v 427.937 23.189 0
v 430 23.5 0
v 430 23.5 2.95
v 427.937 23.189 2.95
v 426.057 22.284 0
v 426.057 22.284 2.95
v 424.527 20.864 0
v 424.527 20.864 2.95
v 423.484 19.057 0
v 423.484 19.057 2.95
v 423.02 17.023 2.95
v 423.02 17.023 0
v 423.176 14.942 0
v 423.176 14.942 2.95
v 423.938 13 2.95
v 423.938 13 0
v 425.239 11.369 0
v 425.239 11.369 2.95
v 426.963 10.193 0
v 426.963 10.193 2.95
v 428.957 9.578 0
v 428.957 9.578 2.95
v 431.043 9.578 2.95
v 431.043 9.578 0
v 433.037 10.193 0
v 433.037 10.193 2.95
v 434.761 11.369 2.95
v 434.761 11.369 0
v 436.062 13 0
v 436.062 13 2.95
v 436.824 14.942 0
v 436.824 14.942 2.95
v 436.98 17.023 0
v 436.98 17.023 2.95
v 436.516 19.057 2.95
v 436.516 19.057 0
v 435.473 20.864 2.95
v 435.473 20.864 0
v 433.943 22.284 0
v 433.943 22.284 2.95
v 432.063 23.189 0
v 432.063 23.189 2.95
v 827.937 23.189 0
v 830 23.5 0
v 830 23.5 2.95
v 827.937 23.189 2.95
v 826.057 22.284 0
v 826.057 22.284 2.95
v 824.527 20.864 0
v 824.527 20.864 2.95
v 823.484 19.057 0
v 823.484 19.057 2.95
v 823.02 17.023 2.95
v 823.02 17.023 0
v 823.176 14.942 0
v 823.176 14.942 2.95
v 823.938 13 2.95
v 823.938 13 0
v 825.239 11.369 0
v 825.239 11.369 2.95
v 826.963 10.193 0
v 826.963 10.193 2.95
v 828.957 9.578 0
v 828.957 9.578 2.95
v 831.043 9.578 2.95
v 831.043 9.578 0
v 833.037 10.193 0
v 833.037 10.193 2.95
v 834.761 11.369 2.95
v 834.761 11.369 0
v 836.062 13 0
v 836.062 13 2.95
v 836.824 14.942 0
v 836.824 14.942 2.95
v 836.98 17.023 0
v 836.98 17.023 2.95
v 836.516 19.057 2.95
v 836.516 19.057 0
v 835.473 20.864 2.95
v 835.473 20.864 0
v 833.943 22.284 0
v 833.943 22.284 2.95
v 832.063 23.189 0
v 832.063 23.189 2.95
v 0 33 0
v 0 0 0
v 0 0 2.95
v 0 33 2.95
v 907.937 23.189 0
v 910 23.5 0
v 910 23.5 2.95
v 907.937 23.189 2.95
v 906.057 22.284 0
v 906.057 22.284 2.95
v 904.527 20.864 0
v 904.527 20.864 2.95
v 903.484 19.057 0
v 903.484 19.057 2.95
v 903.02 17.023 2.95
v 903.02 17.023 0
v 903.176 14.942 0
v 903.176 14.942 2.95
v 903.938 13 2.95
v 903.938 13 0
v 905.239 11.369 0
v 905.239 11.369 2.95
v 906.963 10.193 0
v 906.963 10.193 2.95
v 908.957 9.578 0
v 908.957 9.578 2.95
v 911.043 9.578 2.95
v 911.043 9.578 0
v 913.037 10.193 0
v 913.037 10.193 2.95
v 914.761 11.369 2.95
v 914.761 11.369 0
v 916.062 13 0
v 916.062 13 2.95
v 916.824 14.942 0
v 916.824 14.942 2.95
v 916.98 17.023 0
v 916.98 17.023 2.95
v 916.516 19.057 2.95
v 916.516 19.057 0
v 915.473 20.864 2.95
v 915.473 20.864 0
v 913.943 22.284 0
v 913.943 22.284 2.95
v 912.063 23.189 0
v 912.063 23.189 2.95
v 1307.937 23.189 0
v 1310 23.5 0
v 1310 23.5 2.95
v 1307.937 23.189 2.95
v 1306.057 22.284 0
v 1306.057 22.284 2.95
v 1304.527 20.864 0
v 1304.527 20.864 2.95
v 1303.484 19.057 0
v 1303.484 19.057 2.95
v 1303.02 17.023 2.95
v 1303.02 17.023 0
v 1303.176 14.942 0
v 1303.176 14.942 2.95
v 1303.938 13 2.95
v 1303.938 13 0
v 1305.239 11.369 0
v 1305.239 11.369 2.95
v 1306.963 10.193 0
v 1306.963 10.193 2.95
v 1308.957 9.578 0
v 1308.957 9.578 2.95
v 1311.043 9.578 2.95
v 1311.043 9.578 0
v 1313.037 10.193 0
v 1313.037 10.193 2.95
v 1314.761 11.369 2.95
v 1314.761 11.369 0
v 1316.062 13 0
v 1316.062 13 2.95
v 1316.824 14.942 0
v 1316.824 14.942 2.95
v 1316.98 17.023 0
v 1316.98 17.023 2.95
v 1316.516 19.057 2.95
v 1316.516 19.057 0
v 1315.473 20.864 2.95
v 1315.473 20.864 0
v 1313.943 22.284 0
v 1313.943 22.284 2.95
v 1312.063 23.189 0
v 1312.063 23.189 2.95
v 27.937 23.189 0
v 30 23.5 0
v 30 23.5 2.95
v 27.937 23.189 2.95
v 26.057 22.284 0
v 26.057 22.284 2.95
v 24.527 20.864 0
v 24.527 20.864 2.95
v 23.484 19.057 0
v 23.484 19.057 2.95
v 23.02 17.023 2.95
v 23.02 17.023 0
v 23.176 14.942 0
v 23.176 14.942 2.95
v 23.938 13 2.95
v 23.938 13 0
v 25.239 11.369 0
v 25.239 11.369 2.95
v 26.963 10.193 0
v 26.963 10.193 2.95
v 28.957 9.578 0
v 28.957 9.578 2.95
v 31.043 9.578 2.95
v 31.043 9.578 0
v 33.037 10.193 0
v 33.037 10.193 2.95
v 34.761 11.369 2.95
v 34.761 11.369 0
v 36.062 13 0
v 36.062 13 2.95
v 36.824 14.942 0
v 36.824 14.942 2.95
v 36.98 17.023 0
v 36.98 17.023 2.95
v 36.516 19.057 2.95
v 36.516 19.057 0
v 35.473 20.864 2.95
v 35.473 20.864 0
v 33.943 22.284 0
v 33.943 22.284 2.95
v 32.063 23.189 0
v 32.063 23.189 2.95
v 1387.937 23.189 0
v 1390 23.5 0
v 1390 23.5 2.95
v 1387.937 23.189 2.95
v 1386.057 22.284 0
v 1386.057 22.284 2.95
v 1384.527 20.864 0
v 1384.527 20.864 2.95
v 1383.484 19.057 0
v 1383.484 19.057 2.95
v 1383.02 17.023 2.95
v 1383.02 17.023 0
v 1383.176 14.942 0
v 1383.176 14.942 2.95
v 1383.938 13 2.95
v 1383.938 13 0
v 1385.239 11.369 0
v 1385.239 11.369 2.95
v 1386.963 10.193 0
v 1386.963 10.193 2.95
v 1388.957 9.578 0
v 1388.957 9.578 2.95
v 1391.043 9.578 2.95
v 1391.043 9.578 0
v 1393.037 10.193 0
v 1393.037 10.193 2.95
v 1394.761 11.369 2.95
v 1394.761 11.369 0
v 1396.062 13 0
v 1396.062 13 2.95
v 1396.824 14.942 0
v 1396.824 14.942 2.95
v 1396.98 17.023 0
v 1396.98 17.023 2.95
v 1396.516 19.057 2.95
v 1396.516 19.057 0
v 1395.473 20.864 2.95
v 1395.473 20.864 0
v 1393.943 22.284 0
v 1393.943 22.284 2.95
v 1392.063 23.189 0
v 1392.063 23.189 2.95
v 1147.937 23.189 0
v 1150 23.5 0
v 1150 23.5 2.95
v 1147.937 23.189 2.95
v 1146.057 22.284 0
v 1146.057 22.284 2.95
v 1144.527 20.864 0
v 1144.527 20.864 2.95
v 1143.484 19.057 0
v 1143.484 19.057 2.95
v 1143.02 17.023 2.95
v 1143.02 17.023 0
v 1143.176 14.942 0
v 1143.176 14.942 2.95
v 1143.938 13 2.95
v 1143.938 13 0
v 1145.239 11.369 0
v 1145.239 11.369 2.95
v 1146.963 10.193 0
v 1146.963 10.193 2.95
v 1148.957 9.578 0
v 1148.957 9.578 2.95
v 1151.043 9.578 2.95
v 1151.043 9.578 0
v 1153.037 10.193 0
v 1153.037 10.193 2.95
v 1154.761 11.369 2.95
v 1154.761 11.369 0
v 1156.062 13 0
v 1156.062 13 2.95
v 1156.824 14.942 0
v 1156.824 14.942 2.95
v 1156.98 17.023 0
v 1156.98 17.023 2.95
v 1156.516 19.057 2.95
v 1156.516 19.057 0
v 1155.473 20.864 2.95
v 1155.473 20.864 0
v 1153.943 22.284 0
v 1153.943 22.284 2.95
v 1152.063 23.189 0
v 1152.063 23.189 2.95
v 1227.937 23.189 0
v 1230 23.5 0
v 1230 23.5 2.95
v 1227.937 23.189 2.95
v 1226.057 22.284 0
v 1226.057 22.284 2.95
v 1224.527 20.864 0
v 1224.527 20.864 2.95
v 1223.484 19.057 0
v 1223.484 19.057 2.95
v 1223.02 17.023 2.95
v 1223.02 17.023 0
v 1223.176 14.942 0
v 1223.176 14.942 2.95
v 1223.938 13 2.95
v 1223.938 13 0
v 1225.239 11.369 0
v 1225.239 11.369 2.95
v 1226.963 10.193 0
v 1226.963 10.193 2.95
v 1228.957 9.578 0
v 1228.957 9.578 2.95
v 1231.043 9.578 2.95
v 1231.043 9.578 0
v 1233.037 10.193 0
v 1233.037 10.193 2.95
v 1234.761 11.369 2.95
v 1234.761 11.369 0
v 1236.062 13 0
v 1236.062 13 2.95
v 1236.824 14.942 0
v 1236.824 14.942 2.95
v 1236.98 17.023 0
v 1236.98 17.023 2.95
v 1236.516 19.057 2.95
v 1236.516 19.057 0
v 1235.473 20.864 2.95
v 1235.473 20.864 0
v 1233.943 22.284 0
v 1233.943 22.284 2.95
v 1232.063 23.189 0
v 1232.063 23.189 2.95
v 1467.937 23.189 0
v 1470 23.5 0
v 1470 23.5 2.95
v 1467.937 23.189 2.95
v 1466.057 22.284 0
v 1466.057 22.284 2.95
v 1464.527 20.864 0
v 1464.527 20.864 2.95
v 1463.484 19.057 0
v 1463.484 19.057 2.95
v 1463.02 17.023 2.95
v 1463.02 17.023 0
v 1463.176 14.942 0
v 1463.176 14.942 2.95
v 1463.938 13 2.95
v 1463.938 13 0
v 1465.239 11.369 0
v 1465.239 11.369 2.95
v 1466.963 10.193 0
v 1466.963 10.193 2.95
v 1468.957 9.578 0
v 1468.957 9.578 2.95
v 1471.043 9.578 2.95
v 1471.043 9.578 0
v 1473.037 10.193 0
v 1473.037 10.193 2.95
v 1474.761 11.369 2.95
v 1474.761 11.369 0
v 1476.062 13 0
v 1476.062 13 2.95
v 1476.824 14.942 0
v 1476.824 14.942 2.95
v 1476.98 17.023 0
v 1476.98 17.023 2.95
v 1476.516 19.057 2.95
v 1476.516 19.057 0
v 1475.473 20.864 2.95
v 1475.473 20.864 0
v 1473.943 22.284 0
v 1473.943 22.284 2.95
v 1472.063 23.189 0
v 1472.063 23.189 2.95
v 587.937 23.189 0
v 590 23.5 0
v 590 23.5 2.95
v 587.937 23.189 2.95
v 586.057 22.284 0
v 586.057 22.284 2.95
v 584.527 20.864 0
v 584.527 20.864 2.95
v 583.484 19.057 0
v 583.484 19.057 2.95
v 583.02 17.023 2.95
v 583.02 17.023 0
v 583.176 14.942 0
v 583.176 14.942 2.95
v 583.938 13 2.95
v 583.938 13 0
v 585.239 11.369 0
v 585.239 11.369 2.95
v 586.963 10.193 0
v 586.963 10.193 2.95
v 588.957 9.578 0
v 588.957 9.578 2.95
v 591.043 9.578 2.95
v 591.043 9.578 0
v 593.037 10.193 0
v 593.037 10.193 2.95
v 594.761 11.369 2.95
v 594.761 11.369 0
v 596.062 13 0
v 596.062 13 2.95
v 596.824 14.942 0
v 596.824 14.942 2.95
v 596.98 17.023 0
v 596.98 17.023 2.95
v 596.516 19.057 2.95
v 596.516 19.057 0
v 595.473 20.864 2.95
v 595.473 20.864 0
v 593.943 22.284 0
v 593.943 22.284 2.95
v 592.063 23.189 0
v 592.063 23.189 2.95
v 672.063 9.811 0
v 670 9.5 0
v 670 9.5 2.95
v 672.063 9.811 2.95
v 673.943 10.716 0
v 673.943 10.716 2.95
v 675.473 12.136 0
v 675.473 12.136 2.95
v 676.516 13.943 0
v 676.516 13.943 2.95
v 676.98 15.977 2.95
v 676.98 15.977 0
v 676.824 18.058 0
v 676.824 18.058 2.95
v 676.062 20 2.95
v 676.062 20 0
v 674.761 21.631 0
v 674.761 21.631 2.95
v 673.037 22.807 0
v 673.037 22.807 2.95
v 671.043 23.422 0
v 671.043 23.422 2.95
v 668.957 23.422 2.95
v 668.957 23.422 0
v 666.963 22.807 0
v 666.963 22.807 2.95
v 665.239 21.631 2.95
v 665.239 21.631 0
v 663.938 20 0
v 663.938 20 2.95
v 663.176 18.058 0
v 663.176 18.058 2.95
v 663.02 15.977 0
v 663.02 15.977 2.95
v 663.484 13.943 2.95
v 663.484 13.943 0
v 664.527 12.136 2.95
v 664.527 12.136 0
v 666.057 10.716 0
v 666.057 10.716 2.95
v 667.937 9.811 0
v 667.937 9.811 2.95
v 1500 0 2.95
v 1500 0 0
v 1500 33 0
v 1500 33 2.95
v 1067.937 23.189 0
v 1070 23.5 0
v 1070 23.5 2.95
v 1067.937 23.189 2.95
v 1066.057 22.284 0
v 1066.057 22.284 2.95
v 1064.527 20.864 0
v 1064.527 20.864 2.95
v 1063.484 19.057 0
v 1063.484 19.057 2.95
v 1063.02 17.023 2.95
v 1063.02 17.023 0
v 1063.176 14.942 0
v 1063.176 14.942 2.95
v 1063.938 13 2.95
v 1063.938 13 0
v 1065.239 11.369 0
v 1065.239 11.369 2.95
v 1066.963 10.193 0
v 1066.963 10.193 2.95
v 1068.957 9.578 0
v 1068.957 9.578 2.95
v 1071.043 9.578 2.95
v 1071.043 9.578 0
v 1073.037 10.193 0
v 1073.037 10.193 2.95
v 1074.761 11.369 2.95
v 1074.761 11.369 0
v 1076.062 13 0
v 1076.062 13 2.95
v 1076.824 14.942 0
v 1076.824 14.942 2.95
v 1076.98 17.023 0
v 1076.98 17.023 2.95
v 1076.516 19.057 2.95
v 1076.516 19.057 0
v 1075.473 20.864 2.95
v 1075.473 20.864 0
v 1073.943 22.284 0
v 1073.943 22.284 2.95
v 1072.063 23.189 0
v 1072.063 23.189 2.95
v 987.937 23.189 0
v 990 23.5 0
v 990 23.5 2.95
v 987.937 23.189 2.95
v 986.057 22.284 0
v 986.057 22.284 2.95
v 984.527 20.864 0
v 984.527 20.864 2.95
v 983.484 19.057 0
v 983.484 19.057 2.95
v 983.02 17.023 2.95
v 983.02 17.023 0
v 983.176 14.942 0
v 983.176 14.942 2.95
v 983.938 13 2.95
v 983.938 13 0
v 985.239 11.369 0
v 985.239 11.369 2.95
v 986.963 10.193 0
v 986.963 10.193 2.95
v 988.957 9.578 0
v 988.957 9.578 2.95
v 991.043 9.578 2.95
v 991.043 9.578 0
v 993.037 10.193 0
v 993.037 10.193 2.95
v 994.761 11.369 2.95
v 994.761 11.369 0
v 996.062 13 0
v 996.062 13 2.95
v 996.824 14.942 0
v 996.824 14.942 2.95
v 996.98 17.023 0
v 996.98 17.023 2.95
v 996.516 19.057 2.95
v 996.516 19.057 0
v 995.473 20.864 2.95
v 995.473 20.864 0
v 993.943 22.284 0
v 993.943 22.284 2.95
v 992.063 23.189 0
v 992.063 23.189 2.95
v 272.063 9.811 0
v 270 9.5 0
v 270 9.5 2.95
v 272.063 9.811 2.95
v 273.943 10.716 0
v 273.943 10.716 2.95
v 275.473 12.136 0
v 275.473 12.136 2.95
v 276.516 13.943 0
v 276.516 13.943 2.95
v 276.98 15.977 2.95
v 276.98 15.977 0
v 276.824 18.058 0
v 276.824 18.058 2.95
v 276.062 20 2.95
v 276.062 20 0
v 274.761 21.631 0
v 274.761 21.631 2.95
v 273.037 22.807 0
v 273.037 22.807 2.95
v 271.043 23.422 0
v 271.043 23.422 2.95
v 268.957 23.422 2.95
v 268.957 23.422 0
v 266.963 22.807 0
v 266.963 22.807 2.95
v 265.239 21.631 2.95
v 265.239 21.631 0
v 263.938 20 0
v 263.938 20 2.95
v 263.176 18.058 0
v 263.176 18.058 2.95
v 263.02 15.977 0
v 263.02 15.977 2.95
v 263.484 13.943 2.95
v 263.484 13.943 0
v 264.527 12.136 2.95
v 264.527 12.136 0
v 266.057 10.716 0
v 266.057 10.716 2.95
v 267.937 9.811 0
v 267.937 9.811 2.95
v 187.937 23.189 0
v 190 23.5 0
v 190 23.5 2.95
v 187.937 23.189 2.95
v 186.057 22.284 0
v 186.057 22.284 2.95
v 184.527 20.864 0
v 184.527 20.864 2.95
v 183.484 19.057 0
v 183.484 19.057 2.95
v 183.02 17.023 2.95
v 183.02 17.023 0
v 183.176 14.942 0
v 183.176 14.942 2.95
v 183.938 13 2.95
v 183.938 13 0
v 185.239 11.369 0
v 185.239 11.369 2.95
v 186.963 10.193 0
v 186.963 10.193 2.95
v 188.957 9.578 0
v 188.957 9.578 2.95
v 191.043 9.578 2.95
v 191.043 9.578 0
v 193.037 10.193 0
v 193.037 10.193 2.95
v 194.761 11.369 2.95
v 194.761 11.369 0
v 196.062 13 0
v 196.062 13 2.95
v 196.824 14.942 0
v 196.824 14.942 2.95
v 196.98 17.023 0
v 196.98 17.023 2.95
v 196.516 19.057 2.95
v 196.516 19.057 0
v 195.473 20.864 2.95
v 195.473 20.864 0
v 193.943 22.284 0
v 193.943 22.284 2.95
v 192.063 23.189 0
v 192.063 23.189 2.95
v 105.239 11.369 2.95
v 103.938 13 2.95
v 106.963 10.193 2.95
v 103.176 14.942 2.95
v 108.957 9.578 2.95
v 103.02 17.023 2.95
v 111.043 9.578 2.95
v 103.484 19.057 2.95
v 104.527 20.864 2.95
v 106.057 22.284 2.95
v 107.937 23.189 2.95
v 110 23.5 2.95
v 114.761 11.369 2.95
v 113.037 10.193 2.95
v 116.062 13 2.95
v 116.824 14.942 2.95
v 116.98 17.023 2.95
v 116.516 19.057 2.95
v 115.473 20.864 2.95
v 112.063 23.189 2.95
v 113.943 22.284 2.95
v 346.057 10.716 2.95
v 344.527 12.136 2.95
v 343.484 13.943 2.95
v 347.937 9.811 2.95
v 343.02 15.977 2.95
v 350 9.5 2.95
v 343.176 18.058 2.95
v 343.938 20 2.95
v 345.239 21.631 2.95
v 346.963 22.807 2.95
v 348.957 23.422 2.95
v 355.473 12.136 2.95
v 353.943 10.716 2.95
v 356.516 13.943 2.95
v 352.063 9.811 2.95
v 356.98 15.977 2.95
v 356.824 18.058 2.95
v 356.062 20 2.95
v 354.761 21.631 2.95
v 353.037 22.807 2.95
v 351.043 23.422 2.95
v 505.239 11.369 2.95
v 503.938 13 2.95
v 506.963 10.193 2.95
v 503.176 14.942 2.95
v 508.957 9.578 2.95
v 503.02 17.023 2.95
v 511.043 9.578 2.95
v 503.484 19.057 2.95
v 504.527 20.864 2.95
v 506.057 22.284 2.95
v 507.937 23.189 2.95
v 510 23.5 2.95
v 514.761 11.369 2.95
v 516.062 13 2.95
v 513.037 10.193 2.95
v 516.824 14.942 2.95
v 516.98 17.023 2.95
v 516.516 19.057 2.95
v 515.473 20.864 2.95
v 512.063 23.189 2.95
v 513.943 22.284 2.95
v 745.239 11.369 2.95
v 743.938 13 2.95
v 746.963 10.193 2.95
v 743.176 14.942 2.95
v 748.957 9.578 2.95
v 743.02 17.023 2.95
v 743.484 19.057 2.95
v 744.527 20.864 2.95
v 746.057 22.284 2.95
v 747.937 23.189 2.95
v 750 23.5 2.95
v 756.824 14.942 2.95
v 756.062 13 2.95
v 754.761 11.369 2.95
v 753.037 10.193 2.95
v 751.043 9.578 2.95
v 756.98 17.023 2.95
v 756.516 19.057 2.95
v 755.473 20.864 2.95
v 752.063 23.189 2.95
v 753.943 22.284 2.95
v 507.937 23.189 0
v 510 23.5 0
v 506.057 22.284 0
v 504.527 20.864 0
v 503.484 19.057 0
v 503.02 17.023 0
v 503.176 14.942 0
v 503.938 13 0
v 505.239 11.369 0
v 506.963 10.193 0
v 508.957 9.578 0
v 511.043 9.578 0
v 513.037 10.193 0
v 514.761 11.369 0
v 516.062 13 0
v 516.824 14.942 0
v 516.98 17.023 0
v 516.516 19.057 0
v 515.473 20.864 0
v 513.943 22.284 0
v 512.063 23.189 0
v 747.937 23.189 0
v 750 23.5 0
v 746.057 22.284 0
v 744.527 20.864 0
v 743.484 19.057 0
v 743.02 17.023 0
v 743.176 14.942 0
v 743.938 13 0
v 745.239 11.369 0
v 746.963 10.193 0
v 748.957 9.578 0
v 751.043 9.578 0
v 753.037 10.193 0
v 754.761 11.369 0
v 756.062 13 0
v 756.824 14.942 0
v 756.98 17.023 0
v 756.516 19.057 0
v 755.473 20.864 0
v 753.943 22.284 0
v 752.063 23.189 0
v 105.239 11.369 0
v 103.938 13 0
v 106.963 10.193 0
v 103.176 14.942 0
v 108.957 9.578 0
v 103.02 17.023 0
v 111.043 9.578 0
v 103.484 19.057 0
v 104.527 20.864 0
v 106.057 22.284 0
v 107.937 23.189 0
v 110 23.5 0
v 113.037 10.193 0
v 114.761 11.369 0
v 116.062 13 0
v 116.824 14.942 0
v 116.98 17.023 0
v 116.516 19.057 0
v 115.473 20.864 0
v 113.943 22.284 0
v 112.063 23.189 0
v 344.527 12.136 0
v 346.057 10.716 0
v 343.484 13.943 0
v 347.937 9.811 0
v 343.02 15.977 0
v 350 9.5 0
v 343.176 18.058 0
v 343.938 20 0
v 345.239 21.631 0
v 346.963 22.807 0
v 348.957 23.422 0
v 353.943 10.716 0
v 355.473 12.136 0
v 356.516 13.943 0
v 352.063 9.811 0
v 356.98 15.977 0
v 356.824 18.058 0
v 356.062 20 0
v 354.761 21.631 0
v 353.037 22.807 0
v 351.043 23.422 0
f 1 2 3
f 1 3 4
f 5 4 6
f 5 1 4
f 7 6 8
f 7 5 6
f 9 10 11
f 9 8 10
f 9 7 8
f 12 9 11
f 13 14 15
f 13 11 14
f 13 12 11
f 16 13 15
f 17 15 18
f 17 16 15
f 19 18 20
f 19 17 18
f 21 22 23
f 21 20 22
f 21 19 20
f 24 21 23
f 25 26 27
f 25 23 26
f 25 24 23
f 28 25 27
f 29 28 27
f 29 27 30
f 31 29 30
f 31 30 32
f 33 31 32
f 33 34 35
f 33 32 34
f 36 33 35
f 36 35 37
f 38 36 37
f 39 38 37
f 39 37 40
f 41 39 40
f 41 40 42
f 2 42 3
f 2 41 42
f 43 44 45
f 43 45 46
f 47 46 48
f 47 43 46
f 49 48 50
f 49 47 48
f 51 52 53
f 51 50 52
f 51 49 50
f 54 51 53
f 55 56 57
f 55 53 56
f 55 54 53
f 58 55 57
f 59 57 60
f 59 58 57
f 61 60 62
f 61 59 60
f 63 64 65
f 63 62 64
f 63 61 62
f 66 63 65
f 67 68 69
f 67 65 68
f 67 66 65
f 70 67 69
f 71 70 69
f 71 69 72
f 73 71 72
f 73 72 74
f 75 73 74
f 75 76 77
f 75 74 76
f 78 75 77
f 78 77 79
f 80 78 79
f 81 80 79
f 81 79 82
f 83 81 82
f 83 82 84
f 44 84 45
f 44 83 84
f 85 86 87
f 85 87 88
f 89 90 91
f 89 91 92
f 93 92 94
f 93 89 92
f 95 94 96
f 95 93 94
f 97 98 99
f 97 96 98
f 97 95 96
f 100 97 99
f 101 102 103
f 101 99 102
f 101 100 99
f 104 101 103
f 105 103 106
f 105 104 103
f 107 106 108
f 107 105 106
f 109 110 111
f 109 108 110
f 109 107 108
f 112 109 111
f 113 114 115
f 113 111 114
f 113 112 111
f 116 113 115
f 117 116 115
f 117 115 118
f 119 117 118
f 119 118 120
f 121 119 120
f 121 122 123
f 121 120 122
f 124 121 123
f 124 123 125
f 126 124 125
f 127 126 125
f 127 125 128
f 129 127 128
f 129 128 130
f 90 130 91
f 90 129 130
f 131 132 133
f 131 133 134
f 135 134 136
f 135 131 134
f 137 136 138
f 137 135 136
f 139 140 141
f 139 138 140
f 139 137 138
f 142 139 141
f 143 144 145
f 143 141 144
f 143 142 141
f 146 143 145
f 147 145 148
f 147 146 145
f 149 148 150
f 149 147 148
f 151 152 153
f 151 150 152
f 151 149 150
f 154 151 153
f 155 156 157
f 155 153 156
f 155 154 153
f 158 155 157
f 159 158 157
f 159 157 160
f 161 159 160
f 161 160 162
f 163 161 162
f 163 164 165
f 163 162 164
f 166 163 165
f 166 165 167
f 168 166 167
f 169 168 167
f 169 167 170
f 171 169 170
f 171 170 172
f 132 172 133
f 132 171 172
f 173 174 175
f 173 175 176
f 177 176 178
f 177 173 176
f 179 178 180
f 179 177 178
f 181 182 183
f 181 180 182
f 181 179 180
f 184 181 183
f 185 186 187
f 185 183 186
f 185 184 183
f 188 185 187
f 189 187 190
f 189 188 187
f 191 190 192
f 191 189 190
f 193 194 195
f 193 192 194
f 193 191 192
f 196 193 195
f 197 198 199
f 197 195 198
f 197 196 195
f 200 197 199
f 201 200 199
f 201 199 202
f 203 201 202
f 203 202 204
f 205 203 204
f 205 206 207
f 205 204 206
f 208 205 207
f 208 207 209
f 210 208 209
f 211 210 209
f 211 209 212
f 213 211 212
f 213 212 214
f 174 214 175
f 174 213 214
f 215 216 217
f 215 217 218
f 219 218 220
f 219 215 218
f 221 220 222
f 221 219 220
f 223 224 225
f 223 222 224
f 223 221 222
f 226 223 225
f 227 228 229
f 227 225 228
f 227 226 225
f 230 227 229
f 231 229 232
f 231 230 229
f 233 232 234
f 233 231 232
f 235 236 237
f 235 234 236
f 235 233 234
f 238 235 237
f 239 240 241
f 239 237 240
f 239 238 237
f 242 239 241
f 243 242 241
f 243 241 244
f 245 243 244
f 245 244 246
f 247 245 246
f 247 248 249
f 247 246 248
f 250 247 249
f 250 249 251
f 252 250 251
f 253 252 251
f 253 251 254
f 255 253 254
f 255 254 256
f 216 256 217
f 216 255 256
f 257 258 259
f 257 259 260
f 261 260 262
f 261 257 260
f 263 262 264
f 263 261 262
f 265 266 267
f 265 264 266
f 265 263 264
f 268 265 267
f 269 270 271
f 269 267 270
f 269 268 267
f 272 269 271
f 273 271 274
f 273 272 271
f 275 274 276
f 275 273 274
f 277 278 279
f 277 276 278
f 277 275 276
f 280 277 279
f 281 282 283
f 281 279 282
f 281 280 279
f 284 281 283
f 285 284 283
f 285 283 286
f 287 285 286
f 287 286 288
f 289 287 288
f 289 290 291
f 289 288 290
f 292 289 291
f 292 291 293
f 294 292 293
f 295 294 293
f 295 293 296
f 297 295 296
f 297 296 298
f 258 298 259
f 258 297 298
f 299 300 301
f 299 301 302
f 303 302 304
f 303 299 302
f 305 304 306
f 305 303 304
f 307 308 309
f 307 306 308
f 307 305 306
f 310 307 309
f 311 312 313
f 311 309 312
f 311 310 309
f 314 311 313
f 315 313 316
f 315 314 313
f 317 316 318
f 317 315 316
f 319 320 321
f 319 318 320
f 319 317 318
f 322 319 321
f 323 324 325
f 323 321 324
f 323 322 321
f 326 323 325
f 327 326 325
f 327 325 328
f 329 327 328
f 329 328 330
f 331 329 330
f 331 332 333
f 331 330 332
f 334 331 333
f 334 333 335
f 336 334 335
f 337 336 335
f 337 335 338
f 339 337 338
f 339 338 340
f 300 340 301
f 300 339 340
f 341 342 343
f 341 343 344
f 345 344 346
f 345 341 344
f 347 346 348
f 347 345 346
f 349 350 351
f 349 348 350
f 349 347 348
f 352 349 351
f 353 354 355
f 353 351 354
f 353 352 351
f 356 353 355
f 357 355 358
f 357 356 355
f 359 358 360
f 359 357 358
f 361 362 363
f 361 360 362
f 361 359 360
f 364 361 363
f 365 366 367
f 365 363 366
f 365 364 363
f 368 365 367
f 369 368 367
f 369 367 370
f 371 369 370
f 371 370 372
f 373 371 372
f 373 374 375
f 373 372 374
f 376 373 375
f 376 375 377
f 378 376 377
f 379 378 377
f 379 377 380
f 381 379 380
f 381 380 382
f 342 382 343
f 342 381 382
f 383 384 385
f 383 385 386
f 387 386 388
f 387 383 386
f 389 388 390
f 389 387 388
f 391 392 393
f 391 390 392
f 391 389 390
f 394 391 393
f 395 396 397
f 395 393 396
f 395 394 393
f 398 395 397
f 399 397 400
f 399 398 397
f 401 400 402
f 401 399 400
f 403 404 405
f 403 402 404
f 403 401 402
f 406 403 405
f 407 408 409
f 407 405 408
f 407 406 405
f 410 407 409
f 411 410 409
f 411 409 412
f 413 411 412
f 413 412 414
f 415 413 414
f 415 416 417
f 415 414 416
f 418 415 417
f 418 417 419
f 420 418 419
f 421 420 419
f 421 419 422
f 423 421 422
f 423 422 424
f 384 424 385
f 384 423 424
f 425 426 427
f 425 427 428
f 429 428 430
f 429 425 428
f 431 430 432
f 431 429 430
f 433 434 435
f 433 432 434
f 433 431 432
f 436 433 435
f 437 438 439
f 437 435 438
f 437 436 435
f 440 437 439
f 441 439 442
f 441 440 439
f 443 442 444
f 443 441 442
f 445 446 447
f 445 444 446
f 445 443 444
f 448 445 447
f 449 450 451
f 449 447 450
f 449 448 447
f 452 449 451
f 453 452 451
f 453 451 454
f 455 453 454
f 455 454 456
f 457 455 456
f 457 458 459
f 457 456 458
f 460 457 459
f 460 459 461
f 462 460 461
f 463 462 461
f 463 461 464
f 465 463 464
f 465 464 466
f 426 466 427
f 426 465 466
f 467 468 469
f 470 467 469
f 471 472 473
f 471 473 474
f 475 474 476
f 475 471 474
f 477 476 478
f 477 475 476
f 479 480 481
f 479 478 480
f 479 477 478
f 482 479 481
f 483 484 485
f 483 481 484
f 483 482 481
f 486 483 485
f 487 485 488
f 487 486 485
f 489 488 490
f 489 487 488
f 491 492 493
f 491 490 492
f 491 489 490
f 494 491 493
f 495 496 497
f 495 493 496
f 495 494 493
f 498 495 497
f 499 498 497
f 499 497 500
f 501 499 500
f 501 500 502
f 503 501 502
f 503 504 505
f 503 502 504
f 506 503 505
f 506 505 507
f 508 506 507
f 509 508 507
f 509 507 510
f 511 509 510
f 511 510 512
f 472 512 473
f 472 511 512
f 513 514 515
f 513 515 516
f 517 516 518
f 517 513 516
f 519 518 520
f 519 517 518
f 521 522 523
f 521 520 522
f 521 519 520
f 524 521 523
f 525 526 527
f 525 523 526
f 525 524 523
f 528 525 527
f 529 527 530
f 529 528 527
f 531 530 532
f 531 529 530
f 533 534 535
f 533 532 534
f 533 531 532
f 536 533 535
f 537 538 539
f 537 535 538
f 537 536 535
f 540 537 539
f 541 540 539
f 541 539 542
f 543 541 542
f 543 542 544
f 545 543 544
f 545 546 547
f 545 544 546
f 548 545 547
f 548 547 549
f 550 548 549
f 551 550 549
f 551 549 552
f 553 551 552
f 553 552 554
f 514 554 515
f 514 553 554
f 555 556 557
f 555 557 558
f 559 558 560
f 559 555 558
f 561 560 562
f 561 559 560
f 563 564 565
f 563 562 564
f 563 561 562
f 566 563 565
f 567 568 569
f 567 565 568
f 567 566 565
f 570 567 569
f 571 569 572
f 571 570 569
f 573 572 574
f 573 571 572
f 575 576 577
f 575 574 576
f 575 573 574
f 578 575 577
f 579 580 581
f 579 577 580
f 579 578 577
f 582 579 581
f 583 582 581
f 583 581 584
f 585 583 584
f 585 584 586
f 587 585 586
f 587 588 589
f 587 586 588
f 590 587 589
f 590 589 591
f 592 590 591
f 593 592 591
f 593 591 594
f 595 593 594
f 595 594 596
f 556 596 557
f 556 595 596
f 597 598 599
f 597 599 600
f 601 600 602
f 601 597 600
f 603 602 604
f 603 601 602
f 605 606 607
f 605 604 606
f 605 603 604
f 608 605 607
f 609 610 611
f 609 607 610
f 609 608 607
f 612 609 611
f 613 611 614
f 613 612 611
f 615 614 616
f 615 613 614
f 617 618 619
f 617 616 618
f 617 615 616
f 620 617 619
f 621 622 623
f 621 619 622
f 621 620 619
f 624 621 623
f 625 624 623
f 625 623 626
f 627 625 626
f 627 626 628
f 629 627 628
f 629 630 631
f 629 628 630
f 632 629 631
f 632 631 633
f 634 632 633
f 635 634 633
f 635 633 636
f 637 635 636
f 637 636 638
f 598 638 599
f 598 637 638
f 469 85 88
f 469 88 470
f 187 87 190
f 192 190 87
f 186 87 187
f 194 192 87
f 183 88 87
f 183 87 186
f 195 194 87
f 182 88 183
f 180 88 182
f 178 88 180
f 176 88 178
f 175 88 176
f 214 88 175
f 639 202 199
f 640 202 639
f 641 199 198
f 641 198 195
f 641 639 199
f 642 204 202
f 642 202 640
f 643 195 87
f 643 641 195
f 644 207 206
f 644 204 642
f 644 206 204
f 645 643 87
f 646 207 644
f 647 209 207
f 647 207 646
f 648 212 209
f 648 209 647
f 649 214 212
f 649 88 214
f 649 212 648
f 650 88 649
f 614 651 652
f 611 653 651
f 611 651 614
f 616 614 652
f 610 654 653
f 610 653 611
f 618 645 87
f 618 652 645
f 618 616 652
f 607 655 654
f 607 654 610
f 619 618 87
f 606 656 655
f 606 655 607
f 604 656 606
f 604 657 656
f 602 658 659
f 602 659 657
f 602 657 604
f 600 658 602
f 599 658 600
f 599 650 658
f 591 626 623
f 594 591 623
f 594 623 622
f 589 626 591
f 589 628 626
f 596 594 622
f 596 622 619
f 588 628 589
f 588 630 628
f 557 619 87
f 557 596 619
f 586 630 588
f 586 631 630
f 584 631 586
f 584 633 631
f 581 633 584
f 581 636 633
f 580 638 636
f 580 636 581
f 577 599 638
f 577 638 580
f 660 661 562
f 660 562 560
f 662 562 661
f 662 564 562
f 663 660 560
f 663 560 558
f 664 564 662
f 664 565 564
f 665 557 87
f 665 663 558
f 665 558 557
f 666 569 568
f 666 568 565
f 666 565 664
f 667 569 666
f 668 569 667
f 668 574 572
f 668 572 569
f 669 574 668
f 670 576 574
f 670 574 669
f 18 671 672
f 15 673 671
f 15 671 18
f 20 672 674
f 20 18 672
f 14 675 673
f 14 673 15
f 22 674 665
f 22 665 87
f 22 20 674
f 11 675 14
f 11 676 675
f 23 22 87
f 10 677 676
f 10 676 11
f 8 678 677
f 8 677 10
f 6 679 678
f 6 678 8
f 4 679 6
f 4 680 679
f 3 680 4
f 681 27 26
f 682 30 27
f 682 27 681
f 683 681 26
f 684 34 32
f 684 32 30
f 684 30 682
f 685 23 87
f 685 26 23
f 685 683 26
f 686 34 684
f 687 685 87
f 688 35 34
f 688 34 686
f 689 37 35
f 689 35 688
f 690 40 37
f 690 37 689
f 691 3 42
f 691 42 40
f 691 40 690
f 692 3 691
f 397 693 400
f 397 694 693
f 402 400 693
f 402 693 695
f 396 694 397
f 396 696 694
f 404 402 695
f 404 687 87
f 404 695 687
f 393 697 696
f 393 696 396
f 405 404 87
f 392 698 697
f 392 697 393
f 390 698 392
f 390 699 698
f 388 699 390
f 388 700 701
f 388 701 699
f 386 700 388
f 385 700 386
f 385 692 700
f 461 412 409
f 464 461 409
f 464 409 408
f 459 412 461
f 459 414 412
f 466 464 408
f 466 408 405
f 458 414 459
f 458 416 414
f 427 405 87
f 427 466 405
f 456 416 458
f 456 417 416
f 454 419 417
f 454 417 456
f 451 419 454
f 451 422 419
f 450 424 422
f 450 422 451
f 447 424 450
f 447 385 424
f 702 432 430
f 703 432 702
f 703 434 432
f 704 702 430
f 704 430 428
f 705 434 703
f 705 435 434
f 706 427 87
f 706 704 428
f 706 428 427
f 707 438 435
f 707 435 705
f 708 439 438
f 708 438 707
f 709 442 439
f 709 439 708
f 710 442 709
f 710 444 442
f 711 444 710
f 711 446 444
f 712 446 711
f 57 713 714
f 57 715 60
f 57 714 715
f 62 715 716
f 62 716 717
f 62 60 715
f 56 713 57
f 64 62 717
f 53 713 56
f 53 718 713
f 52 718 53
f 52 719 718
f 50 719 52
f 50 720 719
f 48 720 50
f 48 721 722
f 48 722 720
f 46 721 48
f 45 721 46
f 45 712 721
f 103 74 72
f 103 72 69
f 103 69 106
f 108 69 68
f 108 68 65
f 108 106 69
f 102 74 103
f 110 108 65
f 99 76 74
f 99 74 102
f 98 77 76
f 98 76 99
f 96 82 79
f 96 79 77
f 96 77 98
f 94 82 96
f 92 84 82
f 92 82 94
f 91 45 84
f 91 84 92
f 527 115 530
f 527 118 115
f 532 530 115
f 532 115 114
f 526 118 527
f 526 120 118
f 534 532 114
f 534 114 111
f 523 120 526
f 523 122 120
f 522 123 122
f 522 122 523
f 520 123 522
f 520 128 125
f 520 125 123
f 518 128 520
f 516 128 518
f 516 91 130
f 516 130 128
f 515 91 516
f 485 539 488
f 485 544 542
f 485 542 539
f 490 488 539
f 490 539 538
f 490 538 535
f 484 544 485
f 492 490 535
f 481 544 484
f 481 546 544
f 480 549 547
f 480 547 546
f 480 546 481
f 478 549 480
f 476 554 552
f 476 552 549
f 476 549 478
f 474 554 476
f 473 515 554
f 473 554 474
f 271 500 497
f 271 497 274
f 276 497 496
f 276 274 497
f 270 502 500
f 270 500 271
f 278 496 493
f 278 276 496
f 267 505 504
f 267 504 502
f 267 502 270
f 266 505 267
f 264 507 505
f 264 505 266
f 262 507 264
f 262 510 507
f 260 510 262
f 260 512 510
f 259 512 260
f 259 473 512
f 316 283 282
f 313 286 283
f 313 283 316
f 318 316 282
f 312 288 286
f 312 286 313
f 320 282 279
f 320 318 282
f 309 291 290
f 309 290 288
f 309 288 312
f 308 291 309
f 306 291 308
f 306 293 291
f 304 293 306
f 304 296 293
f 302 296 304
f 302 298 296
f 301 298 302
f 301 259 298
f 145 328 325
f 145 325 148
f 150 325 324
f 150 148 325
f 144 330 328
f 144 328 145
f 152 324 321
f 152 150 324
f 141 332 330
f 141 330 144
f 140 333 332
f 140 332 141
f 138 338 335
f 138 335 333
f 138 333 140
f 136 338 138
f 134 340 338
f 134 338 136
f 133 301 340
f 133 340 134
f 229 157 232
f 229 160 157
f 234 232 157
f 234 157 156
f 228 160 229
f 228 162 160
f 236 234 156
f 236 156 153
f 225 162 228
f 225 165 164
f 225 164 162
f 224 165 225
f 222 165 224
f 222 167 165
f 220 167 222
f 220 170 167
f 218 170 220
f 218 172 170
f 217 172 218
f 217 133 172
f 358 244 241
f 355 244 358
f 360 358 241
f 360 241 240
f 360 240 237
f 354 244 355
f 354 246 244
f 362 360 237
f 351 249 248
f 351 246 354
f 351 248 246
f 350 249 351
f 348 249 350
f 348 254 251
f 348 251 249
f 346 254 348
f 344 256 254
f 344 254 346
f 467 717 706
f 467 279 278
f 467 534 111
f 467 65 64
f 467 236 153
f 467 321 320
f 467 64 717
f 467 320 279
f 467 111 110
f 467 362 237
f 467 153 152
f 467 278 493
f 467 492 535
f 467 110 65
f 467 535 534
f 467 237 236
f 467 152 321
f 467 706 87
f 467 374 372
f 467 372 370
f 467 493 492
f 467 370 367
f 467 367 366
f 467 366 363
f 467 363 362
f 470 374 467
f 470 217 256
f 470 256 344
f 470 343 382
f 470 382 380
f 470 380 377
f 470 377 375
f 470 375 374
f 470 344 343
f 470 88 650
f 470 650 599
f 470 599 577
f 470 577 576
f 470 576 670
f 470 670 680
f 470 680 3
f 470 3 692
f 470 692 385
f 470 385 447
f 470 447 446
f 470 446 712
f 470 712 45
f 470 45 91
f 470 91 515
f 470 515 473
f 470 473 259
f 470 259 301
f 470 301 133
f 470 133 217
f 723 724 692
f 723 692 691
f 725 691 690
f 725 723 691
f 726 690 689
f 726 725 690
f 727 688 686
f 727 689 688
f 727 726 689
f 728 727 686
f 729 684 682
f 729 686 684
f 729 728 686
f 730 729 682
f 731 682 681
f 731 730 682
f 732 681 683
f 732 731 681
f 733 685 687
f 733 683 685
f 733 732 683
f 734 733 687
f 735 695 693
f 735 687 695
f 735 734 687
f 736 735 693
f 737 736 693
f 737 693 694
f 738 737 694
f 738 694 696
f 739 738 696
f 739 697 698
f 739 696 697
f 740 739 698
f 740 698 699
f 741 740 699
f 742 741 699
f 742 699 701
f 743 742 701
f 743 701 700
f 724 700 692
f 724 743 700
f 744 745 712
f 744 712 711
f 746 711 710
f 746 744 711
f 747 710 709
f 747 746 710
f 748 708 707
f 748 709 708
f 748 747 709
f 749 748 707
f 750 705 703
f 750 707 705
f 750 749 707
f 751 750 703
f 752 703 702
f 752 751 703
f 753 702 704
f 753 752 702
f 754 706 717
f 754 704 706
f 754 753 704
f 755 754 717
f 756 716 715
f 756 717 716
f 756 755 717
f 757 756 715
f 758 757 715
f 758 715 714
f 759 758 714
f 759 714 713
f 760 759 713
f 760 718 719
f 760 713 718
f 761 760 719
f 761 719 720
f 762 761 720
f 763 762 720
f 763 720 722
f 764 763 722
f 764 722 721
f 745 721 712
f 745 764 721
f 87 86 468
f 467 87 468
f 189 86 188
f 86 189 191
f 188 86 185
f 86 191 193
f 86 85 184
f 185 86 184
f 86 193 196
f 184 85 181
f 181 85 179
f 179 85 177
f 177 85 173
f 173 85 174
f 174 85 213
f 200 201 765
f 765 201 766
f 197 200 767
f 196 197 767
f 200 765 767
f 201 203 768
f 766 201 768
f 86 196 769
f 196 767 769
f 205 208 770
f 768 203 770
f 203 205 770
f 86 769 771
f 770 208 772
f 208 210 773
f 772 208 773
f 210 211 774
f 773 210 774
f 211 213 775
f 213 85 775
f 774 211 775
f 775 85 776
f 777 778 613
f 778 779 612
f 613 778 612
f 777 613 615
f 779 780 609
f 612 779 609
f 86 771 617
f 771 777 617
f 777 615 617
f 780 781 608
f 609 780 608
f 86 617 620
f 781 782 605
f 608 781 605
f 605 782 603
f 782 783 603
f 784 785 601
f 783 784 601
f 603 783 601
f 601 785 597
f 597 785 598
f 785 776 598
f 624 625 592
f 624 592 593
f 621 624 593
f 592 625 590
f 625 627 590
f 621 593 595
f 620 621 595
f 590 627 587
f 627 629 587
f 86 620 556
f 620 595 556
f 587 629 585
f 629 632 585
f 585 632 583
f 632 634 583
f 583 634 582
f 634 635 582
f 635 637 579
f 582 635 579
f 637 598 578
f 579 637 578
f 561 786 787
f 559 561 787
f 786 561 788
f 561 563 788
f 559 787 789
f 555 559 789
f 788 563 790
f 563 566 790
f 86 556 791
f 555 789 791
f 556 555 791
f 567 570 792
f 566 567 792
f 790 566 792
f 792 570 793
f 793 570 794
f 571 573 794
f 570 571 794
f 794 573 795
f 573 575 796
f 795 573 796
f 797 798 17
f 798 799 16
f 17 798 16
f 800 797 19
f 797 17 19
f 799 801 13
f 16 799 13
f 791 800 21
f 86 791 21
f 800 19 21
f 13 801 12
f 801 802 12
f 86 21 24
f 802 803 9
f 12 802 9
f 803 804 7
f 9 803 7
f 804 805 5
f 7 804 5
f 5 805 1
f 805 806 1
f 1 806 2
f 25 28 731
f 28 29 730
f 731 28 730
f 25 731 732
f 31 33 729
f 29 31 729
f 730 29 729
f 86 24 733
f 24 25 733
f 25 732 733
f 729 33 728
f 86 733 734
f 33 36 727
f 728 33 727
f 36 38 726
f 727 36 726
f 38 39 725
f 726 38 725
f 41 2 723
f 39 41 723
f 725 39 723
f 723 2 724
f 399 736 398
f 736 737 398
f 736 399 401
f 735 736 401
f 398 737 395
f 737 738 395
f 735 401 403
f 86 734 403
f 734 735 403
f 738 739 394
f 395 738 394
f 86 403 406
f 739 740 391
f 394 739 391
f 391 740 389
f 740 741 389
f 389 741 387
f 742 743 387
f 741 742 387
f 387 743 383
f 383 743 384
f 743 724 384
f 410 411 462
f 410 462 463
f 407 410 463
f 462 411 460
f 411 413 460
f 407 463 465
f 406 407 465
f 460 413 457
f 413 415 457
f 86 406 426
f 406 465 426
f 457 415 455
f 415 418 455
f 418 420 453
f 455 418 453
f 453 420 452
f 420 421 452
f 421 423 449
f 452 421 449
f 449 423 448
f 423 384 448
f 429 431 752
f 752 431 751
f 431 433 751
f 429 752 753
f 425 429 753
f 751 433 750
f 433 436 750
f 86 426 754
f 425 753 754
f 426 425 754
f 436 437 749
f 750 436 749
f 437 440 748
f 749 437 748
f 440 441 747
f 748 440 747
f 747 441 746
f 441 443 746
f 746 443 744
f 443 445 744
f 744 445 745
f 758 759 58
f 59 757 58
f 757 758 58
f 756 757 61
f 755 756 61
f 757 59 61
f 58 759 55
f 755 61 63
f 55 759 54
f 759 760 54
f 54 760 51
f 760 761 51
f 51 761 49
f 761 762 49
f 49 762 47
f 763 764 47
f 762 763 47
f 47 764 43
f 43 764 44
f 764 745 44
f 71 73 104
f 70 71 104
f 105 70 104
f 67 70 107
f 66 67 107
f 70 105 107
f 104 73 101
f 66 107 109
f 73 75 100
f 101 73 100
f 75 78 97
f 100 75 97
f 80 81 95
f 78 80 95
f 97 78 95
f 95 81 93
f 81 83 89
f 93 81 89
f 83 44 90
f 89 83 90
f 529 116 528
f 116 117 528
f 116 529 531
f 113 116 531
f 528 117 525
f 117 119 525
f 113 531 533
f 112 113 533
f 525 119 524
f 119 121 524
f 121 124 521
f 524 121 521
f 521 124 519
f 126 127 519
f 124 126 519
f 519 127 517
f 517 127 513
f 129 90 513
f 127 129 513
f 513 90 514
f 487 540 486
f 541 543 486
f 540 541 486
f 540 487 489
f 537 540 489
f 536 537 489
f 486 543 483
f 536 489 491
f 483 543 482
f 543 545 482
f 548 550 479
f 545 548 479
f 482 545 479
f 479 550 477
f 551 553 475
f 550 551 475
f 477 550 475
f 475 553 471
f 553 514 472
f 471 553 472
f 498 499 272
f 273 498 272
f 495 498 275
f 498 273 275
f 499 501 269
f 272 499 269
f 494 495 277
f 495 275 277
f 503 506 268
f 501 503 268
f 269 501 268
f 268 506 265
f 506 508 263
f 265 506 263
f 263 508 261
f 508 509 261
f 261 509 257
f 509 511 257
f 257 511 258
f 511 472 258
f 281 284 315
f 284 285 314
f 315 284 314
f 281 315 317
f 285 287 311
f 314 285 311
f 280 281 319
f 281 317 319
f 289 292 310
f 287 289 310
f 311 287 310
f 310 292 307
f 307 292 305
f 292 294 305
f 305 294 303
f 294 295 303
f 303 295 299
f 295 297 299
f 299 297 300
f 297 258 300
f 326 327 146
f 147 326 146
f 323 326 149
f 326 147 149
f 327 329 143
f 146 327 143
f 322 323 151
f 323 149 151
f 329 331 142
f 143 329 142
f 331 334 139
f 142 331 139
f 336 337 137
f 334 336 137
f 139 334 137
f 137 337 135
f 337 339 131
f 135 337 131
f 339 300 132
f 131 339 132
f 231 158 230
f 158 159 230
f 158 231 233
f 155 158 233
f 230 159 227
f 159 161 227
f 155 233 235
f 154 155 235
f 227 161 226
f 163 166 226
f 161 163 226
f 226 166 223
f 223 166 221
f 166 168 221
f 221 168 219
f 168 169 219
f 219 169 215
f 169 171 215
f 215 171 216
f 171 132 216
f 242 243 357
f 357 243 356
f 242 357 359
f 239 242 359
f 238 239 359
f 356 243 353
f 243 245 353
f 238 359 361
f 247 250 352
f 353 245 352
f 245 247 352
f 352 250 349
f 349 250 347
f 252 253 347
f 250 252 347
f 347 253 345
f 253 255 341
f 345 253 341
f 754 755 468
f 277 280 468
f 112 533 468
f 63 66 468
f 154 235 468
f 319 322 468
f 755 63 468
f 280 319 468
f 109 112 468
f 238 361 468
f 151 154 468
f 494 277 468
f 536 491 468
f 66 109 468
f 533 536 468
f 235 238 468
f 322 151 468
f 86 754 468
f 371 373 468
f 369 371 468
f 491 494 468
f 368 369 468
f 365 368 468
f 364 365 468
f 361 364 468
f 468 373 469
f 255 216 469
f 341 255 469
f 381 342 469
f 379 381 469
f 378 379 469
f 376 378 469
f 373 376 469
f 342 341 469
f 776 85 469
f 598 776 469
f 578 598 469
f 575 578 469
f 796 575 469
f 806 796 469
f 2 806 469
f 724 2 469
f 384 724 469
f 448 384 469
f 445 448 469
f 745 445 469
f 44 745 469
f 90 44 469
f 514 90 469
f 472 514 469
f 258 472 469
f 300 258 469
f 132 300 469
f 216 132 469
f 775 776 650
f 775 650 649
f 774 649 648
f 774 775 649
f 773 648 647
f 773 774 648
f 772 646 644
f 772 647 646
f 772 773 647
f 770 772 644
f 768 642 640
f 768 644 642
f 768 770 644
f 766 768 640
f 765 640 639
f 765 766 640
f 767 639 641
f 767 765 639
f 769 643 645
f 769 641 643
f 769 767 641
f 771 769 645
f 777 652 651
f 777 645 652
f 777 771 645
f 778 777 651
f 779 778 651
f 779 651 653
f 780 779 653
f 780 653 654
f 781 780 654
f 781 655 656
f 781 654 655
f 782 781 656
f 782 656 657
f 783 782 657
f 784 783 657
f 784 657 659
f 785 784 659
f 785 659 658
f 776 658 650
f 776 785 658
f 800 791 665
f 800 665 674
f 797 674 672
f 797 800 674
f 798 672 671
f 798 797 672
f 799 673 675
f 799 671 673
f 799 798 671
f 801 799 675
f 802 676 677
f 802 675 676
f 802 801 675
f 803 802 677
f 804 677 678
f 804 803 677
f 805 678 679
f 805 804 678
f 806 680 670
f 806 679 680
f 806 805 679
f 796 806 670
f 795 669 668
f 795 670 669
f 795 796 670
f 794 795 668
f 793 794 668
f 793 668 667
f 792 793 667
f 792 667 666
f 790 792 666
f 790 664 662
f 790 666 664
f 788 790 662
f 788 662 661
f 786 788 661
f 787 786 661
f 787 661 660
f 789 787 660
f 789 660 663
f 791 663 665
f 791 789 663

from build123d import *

# Parameters (mm, degrees)
SKETCH1_W               = 1500
SKETCH1_H               = 33
BOSS_EXTRUDE1_DEPTH     = 2.95
CUT_EXTRUDE1_DEPTH      = 1501.365856216
CUT_EXTRUDE1_DEPTH_BACK = 1501.365856216


with BuildPart() as part:
    # Sketch1 → Boss-Extrude1 (new body)
    with BuildSketch(Plane.XY):
        with Locations((750, 16.5)):
            Rectangle(SKETCH1_W, SKETCH1_H)
    extrude(amount=BOSS_EXTRUDE1_DEPTH)

    # Sketch3 → Cut-Extrude1 (cut, two sides: drawn at the far end of the back side and taken through both)
    with BuildSketch(Plane.XY.offset(-CUT_EXTRUDE1_DEPTH_BACK)):
        with BuildLine():
            ThreePointArc((270, 23.5), (263, 16.5), (270, 9.5))
            ThreePointArc((270, 9.5), (277, 16.5), (270, 23.5))
        make_face()
        with BuildLine():
            ThreePointArc((350, 23.5), (343, 16.5), (350, 9.5))
            ThreePointArc((350, 9.5), (357, 16.5), (350, 23.5))
        make_face()
        with BuildLine():
            ThreePointArc((430, 9.5), (437, 16.5), (430, 23.5))
            ThreePointArc((430, 23.5), (423, 16.5), (430, 9.5))
        make_face()
        with BuildLine():
            ThreePointArc((510, 9.5), (517, 16.5), (510, 23.5))
            ThreePointArc((510, 23.5), (503, 16.5), (510, 9.5))
        make_face()
        with BuildLine():
            ThreePointArc((590, 9.5), (597, 16.5), (590, 23.5))
            ThreePointArc((590, 23.5), (583, 16.5), (590, 9.5))
        make_face()
        with BuildLine():
            ThreePointArc((670, 23.5), (663, 16.5), (670, 9.5))
            ThreePointArc((670, 9.5), (677, 16.5), (670, 23.5))
        make_face()
        with BuildLine():
            ThreePointArc((750, 9.5), (757, 16.5), (750, 23.5))
            ThreePointArc((750, 23.5), (743, 16.5), (750, 9.5))
        make_face()
        with BuildLine():
            ThreePointArc((830, 9.5), (837, 16.5), (830, 23.5))
            ThreePointArc((830, 23.5), (823, 16.5), (830, 9.5))
        make_face()
        with BuildLine():
            ThreePointArc((910, 9.5), (917, 16.5), (910, 23.5))
            ThreePointArc((910, 23.5), (903, 16.5), (910, 9.5))
        make_face()
        with BuildLine():
            ThreePointArc((990, 9.5), (997, 16.5), (990, 23.5))
            ThreePointArc((990, 23.5), (983, 16.5), (990, 9.5))
        make_face()
        with BuildLine():
            ThreePointArc((1070, 9.5), (1077, 16.5), (1070, 23.5))
            ThreePointArc((1070, 23.5), (1063, 16.5), (1070, 9.5))
        make_face()
        with BuildLine():
            ThreePointArc((1150, 9.5), (1157, 16.5), (1150, 23.5))
            ThreePointArc((1150, 23.5), (1143, 16.5), (1150, 9.5))
        make_face()
        with BuildLine():
            ThreePointArc((1230, 9.5), (1237, 16.5), (1230, 23.5))
            ThreePointArc((1230, 23.5), (1223, 16.5), (1230, 9.5))
        make_face()
        with BuildLine():
            ThreePointArc((1310, 9.5), (1317, 16.5), (1310, 23.5))
            ThreePointArc((1310, 23.5), (1303, 16.5), (1310, 9.5))
        make_face()
        with BuildLine():
            ThreePointArc((1390, 9.5), (1397, 16.5), (1390, 23.5))
            ThreePointArc((1390, 23.5), (1383, 16.5), (1390, 9.5))
        make_face()
        with BuildLine():
            ThreePointArc((1470, 9.5), (1477, 16.5), (1470, 23.5))
            ThreePointArc((1470, 23.5), (1463, 16.5), (1470, 9.5))
        make_face()
        with BuildLine():
            ThreePointArc((30, 9.5), (37, 16.5), (30, 23.5))
            ThreePointArc((30, 23.5), (23, 16.5), (30, 9.5))
        make_face()
        with BuildLine():
            ThreePointArc((110, 9.5), (117, 16.5), (110, 23.5))
            ThreePointArc((110, 23.5), (103, 16.5), (110, 9.5))
        make_face()
        with BuildLine():
            ThreePointArc((190, 9.5), (197, 16.5), (190, 23.5))
            ThreePointArc((190, 23.5), (183, 16.5), (190, 9.5))
        make_face()
    extrude(amount=CUT_EXTRUDE1_DEPTH + CUT_EXTRUDE1_DEPTH_BACK, mode=Mode.SUBTRACT)


solid = part.part
